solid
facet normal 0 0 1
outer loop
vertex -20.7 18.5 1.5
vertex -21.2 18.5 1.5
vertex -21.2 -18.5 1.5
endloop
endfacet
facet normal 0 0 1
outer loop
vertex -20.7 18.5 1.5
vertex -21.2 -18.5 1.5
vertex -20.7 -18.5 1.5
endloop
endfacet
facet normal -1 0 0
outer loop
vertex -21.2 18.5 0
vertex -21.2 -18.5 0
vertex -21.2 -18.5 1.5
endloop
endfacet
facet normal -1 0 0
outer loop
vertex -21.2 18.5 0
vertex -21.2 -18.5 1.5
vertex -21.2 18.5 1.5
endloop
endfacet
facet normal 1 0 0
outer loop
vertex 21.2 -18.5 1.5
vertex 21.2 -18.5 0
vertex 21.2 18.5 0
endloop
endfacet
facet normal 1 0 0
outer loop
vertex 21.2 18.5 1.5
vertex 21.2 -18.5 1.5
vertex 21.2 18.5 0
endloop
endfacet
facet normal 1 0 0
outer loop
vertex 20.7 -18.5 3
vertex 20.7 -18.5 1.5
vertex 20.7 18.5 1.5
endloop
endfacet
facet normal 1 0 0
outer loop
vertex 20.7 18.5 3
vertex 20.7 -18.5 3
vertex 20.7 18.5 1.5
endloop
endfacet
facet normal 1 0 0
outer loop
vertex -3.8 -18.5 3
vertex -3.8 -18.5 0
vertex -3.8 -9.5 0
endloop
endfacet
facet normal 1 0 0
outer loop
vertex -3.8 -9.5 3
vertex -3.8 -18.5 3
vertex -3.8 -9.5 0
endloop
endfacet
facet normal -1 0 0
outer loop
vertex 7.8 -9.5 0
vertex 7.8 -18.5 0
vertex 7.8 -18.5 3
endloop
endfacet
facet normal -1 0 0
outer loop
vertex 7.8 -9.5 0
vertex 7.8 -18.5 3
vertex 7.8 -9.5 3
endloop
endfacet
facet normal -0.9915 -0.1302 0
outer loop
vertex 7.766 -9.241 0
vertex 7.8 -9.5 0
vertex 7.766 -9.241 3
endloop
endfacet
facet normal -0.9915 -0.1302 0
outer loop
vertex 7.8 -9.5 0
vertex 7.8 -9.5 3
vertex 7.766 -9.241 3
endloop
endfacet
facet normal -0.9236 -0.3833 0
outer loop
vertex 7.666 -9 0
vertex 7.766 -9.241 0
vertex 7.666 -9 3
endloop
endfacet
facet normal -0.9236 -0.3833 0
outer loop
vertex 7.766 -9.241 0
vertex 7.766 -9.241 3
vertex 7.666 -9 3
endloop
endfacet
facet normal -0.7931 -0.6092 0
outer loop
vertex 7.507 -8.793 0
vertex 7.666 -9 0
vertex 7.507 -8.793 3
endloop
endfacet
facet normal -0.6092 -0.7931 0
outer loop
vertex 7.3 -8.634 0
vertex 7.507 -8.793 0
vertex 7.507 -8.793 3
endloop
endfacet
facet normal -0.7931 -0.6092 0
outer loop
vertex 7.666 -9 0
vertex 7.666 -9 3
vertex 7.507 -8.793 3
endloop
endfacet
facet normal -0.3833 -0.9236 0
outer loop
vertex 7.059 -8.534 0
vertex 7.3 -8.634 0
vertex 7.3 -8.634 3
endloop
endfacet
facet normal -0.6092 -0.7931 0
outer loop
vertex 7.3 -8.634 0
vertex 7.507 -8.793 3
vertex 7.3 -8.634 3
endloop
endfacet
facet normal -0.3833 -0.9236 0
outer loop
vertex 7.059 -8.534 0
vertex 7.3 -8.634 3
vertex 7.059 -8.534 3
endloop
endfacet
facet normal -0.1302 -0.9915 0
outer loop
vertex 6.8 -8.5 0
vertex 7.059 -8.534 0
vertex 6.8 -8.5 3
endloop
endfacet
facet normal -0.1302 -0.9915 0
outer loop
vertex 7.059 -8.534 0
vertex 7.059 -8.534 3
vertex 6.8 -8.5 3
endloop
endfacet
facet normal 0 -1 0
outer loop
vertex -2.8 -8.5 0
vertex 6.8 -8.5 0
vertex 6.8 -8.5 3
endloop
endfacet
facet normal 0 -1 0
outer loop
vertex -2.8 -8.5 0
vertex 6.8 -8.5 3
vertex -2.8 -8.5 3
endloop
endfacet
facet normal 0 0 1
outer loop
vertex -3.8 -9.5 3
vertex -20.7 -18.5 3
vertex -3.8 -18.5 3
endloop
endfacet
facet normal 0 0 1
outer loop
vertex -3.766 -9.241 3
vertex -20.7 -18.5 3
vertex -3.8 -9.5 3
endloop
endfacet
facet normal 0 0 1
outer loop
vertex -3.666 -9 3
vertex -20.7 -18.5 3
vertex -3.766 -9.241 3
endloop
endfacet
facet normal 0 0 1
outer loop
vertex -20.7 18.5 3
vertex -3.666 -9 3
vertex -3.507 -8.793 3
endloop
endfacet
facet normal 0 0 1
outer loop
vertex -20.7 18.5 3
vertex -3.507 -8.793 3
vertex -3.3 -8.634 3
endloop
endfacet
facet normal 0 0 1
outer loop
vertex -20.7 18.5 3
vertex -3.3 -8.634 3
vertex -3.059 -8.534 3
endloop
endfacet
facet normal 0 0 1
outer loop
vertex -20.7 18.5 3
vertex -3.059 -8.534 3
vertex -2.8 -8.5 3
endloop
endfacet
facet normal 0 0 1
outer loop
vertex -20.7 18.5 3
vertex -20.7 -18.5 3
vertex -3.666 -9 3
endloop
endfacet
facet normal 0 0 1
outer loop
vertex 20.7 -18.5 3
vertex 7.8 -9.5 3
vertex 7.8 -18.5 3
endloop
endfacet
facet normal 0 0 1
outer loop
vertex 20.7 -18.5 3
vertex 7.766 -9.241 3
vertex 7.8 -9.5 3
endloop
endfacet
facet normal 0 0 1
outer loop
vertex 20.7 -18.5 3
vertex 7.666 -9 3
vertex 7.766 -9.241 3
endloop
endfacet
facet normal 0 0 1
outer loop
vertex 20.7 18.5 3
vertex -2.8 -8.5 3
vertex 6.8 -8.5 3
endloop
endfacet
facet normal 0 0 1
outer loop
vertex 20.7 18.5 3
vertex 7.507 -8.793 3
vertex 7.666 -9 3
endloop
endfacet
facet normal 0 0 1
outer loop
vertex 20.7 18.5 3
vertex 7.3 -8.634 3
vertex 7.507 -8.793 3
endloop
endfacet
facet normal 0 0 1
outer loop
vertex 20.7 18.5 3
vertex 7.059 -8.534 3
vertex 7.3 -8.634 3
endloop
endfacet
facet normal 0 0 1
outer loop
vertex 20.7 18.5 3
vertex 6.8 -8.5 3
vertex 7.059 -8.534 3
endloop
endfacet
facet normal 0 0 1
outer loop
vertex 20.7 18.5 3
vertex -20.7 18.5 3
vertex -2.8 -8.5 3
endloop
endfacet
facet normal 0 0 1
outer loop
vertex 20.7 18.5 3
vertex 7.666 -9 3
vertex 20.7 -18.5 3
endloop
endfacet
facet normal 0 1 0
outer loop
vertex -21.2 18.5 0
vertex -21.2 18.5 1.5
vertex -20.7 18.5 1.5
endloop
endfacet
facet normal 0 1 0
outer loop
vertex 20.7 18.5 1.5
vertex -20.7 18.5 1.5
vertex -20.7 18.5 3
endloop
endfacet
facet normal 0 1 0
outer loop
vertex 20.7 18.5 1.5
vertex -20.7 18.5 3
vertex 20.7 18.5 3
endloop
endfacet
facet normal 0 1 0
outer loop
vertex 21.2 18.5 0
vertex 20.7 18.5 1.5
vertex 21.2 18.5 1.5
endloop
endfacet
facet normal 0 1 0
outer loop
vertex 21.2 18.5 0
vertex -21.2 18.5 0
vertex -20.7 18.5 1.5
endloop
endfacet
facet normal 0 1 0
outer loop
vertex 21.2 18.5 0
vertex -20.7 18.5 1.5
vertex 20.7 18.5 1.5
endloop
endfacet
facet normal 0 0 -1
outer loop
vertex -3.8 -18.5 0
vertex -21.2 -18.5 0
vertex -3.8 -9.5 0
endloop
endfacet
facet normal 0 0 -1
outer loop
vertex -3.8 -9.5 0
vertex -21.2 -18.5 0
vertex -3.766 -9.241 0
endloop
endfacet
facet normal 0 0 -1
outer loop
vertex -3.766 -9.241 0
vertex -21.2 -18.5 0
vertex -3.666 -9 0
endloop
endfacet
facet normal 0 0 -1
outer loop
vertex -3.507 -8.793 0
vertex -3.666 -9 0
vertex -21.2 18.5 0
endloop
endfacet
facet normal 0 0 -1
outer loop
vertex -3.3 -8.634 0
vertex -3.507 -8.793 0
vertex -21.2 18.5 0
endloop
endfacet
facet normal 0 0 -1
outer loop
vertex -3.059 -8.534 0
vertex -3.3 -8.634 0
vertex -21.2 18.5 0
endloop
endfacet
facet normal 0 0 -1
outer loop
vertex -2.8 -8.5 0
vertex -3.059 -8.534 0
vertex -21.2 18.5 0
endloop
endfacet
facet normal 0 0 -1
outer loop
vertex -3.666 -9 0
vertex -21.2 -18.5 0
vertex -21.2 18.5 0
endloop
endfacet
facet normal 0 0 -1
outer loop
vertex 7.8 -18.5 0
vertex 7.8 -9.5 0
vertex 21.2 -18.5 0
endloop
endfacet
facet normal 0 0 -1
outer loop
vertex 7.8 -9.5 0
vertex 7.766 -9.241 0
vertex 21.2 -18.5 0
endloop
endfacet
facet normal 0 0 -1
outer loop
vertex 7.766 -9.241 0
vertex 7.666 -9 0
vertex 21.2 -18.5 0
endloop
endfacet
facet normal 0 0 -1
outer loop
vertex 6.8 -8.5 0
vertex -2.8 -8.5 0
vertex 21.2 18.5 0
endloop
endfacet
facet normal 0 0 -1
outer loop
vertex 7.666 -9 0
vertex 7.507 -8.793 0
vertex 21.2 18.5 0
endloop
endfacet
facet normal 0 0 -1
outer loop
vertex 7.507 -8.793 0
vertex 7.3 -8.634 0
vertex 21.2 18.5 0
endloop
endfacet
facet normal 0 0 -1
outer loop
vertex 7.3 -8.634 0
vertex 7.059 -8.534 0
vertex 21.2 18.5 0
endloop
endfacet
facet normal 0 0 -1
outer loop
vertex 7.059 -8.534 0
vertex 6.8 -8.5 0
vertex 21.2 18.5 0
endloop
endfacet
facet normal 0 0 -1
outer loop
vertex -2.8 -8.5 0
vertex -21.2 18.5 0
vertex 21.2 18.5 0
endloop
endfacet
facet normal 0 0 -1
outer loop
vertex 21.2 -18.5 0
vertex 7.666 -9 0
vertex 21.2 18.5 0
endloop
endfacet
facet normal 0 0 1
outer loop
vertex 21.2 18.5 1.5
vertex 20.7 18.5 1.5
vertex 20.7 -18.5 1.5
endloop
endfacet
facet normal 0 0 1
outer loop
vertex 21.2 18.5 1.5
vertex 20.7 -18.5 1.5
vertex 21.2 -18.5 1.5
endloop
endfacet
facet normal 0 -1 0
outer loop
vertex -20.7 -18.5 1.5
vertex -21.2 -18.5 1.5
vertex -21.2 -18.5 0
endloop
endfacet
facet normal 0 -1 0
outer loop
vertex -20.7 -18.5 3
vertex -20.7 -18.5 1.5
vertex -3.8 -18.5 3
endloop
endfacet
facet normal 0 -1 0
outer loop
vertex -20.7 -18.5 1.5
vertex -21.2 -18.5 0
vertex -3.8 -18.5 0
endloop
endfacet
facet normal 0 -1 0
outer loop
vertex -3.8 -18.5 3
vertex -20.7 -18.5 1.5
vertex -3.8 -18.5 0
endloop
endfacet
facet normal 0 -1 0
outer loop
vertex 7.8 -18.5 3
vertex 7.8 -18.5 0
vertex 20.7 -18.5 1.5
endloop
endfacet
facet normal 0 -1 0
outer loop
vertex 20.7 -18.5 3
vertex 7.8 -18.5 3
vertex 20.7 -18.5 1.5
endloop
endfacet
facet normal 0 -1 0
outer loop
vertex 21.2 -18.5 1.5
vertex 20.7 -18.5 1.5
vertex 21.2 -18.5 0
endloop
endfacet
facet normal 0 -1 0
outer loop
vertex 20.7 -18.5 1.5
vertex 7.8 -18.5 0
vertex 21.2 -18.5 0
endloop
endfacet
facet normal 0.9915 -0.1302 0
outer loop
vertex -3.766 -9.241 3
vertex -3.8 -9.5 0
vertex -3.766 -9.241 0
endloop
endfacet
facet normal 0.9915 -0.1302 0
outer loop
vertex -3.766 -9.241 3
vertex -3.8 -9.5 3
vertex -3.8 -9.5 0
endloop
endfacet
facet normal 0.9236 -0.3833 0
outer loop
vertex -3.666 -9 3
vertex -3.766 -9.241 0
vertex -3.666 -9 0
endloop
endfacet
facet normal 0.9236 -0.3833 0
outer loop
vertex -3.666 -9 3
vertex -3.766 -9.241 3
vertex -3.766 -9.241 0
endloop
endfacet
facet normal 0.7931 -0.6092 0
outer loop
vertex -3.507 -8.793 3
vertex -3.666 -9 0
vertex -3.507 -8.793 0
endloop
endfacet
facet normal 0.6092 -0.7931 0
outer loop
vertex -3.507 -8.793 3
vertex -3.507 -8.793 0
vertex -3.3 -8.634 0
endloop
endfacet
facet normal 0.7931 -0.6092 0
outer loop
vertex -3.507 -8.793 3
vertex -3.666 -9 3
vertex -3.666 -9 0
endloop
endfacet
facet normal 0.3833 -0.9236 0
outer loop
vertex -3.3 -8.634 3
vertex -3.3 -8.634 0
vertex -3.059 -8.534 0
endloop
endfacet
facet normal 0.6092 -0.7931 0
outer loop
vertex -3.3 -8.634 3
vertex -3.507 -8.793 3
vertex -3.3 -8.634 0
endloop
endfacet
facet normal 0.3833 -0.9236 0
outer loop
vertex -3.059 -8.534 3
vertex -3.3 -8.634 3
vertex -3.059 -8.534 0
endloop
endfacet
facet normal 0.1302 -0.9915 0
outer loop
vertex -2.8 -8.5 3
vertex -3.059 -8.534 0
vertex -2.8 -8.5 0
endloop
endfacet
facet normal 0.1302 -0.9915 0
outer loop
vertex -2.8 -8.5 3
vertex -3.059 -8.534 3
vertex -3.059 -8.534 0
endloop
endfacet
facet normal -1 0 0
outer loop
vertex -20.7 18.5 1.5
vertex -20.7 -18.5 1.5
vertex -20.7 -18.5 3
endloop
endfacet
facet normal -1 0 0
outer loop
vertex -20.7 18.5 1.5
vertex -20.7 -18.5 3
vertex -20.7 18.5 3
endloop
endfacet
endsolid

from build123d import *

# Parameters (mm, degrees)
SKETCH1_W           = 42.4
SKETCH1_H           = 37
BOSS_EXTRUDE1_DEPTH = 1.5
SKETCH2_W           = 41.4
SKETCH2_H           = 37
BOSS_EXTRUDE2_DEPTH = 1.5
SKETCH3_W           = 11.6
SKETCH3_H           = 10
CUT_EXTRUDE1_DEPTH  = 29.29646621
FILLET1_R           = 1


with BuildPart() as part:
    # Sketch1 → Boss-Extrude1 (new body)
    with BuildSketch(Plane.XY):
        Rectangle(SKETCH1_W, SKETCH1_H)
    extrude(amount=BOSS_EXTRUDE1_DEPTH)

    # Sketch2 → Boss-Extrude2 (add)
    with BuildSketch(Plane.XY.offset(1.5)):
        Rectangle(SKETCH2_W, SKETCH2_H)
    extrude(amount=BOSS_EXTRUDE2_DEPTH)

    # Sketch3 → Cut-Extrude1 (cut, through all)
    with BuildSketch(Plane(origin=(0, 0, 0), x_dir=(-1, 0, 0), z_dir=(0, 0, -1))):
        with Locations((-2, -13.5)):
            Rectangle(SKETCH3_W, SKETCH3_H)
    extrude(amount=-CUT_EXTRUDE1_DEPTH, mode=Mode.SUBTRACT)

    # Fillet1
    fillet1_edges = [part.edges().sort_by_distance(p)[0] for p in [
        (7.8, -8.5, 1.5),
        (-3.8, -8.5, 1.5),
    ]]
    fillet(fillet1_edges, radius=FILLET1_R)


solid = part.part
